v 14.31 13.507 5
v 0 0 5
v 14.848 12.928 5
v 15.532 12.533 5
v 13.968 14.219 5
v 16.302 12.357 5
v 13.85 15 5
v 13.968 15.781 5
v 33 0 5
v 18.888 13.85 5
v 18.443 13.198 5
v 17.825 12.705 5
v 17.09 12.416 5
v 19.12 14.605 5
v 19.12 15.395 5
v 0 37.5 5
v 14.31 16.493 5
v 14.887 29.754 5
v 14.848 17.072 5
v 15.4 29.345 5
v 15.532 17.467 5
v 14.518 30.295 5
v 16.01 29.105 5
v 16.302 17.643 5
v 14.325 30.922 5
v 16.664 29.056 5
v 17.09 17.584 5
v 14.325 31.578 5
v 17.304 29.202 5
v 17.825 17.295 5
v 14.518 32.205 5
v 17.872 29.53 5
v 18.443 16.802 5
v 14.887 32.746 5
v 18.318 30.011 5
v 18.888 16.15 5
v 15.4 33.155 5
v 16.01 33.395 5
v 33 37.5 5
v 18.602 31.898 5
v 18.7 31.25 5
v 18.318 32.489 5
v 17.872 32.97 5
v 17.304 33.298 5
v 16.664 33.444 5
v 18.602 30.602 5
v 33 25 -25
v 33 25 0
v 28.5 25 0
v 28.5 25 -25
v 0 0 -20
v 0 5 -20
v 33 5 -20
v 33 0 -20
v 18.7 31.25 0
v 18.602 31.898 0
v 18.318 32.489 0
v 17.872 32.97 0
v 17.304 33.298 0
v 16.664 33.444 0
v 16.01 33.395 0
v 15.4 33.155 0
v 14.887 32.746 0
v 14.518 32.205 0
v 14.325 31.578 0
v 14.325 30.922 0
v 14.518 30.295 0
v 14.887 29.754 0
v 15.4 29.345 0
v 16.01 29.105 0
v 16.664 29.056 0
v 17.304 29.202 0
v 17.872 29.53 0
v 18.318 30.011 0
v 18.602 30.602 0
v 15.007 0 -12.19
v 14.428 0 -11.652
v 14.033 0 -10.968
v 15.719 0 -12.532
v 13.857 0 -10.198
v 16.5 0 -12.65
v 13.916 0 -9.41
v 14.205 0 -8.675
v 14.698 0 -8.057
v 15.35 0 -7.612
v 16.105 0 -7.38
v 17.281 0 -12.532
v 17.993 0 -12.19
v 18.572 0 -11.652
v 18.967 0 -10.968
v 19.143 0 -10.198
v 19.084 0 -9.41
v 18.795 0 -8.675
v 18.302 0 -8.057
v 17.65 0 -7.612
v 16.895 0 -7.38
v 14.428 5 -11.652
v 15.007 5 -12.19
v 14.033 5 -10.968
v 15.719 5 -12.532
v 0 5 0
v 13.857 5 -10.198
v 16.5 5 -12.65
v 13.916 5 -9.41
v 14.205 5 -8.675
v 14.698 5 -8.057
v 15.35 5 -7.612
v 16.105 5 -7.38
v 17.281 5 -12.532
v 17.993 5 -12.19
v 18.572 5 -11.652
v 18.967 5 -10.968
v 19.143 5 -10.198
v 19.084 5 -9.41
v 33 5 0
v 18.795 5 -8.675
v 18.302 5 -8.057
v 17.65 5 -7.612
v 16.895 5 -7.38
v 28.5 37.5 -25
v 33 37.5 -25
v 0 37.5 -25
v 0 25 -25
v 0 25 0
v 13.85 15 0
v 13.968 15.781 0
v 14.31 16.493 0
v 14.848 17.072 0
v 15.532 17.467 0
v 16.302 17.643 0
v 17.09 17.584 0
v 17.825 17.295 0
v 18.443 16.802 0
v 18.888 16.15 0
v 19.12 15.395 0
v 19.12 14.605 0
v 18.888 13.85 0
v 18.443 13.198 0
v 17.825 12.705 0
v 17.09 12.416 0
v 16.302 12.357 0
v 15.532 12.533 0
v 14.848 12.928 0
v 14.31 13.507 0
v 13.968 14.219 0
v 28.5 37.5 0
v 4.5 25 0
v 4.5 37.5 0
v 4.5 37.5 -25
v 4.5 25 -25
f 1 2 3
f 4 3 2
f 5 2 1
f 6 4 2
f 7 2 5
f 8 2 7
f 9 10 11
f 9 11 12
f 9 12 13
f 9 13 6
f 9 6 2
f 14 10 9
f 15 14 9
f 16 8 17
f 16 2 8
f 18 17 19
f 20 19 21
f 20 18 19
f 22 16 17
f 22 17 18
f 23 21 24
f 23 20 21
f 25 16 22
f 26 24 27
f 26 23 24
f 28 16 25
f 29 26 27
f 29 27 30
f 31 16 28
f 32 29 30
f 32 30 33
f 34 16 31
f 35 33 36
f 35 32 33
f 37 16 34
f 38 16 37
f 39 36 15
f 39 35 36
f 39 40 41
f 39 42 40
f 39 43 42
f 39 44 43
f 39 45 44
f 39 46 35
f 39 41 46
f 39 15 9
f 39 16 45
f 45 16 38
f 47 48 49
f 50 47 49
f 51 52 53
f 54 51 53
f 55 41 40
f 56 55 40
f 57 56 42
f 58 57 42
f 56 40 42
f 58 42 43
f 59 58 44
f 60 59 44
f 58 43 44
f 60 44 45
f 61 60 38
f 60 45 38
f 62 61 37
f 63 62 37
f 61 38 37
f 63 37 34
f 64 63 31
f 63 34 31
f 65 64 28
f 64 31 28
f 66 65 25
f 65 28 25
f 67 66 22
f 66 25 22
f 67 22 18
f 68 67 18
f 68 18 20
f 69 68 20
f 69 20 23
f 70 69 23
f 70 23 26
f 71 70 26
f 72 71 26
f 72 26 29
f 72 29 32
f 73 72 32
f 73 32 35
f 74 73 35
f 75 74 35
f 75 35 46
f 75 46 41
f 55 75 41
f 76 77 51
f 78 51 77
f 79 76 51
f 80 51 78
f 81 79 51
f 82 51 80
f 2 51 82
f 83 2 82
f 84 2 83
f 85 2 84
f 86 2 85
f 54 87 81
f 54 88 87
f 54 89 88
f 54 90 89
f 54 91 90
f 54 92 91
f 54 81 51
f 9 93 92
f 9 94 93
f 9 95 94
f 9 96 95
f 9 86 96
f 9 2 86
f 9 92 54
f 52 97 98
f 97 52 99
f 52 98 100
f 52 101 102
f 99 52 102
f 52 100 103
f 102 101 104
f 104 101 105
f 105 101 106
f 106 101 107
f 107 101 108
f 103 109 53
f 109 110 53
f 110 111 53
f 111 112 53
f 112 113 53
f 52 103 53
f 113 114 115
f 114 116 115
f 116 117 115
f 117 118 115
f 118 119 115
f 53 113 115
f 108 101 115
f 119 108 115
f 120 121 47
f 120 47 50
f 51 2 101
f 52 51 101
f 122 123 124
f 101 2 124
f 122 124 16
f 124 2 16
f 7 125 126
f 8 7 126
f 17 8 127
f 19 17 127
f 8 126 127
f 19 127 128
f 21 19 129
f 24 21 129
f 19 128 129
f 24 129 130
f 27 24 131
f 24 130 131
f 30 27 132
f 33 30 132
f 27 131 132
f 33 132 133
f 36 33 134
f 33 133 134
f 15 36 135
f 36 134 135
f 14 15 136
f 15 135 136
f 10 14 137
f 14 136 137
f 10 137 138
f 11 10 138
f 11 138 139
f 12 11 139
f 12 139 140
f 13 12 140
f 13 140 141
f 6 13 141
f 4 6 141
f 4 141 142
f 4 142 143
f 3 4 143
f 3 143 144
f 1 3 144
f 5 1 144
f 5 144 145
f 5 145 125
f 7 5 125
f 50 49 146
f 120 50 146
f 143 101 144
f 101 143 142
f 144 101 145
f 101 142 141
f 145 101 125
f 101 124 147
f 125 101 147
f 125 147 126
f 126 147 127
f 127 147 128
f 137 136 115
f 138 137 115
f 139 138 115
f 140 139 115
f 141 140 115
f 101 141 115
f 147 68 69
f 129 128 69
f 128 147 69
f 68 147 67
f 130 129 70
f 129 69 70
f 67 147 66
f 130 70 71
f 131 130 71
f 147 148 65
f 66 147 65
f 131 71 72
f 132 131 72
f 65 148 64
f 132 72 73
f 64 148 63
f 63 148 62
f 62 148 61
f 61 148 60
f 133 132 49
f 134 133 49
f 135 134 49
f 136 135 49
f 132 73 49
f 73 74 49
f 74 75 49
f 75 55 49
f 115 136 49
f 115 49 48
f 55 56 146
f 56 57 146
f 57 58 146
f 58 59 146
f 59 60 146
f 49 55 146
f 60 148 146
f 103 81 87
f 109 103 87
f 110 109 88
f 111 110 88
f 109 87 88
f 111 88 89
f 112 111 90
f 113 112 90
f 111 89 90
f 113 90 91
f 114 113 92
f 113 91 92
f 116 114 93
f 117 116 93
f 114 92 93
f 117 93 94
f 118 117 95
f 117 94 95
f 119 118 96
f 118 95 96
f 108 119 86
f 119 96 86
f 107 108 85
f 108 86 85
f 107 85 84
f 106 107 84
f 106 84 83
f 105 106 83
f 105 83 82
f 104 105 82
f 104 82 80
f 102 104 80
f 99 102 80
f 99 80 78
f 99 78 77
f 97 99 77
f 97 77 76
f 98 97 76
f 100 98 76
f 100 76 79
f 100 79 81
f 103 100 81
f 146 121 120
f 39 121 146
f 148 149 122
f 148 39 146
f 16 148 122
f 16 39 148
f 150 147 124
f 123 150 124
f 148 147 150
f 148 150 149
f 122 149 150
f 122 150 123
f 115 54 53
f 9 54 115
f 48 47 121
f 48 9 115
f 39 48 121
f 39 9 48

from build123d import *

# Parameters (mm, degrees)
SKETCH2_W           = 33
SKETCH2_H           = 37.5
BOSS_EXTRUDE1_DEPTH = 5
SKETCH3_W           = 33
SKETCH3_H           = 5
BOSS_EXTRUDE2_DEPTH = 20
SKETCH6_R           = 2.65
CUT_EXTRUDE2_DEPTH  = 10
SKETCH7_R           = 2.65
CUT_EXTRUDE3_DEPTH  = 10
SKETCH8_W           = 4.5
SKETCH8_H           = 12.5
BOSS_EXTRUDE3_DEPTH = 25
SKETCH9_R           = 2.2
CUT_EXTRUDE4_DEPTH  = 10


with BuildPart() as part:
    # Sketch2 → Boss-Extrude1 (new body)
    with BuildSketch(Plane.XY):
        with Locations((16.5, 18.75)):
            Rectangle(SKETCH2_W, SKETCH2_H)
    extrude(amount=BOSS_EXTRUDE1_DEPTH)

    # Sketch3 → Boss-Extrude2 (add)
    with BuildSketch(Plane.XY):
        with Locations((16.5, 2.5)):
            Rectangle(SKETCH3_W, SKETCH3_H)
    extrude(amount=-BOSS_EXTRUDE2_DEPTH)

    # Sketch6 → Cut-Extrude2 (cut)
    with BuildSketch(Plane.XZ):
        with Locations(Location((16.5, -10, 0), (0, 0, 270))):
            Circle(SKETCH6_R)
    extrude(amount=-CUT_EXTRUDE2_DEPTH, mode=Mode.SUBTRACT)

    # Sketch7 → Cut-Extrude3 (cut)
    with BuildSketch(Plane(origin=(0, 0, 0), x_dir=(-1, 0, 0), z_dir=(0, 0, -1))):
        with Locations((-16.5, 15)):
            Circle(SKETCH7_R)
    extrude(amount=-CUT_EXTRUDE3_DEPTH, mode=Mode.SUBTRACT)

    # Sketch8 → Boss-Extrude3 (add)
    with BuildSketch(Plane(origin=(0, 0, 0), x_dir=(-1, 0, 0), z_dir=(0, 0, -1))):
        with Locations((-30.75, 31.25)):
            Rectangle(SKETCH8_W, SKETCH8_H)
        with Locations((-2.25, 31.25)):
            Rectangle(SKETCH8_W, SKETCH8_H)
    extrude(amount=BOSS_EXTRUDE3_DEPTH)

    # Sketch9 → Cut-Extrude4 (cut)
    with BuildSketch(Plane.XY.offset(5)):
        with Locations((16.5, 31.25)):
            Circle(SKETCH9_R)
    extrude(amount=-CUT_EXTRUDE4_DEPTH, mode=Mode.SUBTRACT)


solid = part.part
